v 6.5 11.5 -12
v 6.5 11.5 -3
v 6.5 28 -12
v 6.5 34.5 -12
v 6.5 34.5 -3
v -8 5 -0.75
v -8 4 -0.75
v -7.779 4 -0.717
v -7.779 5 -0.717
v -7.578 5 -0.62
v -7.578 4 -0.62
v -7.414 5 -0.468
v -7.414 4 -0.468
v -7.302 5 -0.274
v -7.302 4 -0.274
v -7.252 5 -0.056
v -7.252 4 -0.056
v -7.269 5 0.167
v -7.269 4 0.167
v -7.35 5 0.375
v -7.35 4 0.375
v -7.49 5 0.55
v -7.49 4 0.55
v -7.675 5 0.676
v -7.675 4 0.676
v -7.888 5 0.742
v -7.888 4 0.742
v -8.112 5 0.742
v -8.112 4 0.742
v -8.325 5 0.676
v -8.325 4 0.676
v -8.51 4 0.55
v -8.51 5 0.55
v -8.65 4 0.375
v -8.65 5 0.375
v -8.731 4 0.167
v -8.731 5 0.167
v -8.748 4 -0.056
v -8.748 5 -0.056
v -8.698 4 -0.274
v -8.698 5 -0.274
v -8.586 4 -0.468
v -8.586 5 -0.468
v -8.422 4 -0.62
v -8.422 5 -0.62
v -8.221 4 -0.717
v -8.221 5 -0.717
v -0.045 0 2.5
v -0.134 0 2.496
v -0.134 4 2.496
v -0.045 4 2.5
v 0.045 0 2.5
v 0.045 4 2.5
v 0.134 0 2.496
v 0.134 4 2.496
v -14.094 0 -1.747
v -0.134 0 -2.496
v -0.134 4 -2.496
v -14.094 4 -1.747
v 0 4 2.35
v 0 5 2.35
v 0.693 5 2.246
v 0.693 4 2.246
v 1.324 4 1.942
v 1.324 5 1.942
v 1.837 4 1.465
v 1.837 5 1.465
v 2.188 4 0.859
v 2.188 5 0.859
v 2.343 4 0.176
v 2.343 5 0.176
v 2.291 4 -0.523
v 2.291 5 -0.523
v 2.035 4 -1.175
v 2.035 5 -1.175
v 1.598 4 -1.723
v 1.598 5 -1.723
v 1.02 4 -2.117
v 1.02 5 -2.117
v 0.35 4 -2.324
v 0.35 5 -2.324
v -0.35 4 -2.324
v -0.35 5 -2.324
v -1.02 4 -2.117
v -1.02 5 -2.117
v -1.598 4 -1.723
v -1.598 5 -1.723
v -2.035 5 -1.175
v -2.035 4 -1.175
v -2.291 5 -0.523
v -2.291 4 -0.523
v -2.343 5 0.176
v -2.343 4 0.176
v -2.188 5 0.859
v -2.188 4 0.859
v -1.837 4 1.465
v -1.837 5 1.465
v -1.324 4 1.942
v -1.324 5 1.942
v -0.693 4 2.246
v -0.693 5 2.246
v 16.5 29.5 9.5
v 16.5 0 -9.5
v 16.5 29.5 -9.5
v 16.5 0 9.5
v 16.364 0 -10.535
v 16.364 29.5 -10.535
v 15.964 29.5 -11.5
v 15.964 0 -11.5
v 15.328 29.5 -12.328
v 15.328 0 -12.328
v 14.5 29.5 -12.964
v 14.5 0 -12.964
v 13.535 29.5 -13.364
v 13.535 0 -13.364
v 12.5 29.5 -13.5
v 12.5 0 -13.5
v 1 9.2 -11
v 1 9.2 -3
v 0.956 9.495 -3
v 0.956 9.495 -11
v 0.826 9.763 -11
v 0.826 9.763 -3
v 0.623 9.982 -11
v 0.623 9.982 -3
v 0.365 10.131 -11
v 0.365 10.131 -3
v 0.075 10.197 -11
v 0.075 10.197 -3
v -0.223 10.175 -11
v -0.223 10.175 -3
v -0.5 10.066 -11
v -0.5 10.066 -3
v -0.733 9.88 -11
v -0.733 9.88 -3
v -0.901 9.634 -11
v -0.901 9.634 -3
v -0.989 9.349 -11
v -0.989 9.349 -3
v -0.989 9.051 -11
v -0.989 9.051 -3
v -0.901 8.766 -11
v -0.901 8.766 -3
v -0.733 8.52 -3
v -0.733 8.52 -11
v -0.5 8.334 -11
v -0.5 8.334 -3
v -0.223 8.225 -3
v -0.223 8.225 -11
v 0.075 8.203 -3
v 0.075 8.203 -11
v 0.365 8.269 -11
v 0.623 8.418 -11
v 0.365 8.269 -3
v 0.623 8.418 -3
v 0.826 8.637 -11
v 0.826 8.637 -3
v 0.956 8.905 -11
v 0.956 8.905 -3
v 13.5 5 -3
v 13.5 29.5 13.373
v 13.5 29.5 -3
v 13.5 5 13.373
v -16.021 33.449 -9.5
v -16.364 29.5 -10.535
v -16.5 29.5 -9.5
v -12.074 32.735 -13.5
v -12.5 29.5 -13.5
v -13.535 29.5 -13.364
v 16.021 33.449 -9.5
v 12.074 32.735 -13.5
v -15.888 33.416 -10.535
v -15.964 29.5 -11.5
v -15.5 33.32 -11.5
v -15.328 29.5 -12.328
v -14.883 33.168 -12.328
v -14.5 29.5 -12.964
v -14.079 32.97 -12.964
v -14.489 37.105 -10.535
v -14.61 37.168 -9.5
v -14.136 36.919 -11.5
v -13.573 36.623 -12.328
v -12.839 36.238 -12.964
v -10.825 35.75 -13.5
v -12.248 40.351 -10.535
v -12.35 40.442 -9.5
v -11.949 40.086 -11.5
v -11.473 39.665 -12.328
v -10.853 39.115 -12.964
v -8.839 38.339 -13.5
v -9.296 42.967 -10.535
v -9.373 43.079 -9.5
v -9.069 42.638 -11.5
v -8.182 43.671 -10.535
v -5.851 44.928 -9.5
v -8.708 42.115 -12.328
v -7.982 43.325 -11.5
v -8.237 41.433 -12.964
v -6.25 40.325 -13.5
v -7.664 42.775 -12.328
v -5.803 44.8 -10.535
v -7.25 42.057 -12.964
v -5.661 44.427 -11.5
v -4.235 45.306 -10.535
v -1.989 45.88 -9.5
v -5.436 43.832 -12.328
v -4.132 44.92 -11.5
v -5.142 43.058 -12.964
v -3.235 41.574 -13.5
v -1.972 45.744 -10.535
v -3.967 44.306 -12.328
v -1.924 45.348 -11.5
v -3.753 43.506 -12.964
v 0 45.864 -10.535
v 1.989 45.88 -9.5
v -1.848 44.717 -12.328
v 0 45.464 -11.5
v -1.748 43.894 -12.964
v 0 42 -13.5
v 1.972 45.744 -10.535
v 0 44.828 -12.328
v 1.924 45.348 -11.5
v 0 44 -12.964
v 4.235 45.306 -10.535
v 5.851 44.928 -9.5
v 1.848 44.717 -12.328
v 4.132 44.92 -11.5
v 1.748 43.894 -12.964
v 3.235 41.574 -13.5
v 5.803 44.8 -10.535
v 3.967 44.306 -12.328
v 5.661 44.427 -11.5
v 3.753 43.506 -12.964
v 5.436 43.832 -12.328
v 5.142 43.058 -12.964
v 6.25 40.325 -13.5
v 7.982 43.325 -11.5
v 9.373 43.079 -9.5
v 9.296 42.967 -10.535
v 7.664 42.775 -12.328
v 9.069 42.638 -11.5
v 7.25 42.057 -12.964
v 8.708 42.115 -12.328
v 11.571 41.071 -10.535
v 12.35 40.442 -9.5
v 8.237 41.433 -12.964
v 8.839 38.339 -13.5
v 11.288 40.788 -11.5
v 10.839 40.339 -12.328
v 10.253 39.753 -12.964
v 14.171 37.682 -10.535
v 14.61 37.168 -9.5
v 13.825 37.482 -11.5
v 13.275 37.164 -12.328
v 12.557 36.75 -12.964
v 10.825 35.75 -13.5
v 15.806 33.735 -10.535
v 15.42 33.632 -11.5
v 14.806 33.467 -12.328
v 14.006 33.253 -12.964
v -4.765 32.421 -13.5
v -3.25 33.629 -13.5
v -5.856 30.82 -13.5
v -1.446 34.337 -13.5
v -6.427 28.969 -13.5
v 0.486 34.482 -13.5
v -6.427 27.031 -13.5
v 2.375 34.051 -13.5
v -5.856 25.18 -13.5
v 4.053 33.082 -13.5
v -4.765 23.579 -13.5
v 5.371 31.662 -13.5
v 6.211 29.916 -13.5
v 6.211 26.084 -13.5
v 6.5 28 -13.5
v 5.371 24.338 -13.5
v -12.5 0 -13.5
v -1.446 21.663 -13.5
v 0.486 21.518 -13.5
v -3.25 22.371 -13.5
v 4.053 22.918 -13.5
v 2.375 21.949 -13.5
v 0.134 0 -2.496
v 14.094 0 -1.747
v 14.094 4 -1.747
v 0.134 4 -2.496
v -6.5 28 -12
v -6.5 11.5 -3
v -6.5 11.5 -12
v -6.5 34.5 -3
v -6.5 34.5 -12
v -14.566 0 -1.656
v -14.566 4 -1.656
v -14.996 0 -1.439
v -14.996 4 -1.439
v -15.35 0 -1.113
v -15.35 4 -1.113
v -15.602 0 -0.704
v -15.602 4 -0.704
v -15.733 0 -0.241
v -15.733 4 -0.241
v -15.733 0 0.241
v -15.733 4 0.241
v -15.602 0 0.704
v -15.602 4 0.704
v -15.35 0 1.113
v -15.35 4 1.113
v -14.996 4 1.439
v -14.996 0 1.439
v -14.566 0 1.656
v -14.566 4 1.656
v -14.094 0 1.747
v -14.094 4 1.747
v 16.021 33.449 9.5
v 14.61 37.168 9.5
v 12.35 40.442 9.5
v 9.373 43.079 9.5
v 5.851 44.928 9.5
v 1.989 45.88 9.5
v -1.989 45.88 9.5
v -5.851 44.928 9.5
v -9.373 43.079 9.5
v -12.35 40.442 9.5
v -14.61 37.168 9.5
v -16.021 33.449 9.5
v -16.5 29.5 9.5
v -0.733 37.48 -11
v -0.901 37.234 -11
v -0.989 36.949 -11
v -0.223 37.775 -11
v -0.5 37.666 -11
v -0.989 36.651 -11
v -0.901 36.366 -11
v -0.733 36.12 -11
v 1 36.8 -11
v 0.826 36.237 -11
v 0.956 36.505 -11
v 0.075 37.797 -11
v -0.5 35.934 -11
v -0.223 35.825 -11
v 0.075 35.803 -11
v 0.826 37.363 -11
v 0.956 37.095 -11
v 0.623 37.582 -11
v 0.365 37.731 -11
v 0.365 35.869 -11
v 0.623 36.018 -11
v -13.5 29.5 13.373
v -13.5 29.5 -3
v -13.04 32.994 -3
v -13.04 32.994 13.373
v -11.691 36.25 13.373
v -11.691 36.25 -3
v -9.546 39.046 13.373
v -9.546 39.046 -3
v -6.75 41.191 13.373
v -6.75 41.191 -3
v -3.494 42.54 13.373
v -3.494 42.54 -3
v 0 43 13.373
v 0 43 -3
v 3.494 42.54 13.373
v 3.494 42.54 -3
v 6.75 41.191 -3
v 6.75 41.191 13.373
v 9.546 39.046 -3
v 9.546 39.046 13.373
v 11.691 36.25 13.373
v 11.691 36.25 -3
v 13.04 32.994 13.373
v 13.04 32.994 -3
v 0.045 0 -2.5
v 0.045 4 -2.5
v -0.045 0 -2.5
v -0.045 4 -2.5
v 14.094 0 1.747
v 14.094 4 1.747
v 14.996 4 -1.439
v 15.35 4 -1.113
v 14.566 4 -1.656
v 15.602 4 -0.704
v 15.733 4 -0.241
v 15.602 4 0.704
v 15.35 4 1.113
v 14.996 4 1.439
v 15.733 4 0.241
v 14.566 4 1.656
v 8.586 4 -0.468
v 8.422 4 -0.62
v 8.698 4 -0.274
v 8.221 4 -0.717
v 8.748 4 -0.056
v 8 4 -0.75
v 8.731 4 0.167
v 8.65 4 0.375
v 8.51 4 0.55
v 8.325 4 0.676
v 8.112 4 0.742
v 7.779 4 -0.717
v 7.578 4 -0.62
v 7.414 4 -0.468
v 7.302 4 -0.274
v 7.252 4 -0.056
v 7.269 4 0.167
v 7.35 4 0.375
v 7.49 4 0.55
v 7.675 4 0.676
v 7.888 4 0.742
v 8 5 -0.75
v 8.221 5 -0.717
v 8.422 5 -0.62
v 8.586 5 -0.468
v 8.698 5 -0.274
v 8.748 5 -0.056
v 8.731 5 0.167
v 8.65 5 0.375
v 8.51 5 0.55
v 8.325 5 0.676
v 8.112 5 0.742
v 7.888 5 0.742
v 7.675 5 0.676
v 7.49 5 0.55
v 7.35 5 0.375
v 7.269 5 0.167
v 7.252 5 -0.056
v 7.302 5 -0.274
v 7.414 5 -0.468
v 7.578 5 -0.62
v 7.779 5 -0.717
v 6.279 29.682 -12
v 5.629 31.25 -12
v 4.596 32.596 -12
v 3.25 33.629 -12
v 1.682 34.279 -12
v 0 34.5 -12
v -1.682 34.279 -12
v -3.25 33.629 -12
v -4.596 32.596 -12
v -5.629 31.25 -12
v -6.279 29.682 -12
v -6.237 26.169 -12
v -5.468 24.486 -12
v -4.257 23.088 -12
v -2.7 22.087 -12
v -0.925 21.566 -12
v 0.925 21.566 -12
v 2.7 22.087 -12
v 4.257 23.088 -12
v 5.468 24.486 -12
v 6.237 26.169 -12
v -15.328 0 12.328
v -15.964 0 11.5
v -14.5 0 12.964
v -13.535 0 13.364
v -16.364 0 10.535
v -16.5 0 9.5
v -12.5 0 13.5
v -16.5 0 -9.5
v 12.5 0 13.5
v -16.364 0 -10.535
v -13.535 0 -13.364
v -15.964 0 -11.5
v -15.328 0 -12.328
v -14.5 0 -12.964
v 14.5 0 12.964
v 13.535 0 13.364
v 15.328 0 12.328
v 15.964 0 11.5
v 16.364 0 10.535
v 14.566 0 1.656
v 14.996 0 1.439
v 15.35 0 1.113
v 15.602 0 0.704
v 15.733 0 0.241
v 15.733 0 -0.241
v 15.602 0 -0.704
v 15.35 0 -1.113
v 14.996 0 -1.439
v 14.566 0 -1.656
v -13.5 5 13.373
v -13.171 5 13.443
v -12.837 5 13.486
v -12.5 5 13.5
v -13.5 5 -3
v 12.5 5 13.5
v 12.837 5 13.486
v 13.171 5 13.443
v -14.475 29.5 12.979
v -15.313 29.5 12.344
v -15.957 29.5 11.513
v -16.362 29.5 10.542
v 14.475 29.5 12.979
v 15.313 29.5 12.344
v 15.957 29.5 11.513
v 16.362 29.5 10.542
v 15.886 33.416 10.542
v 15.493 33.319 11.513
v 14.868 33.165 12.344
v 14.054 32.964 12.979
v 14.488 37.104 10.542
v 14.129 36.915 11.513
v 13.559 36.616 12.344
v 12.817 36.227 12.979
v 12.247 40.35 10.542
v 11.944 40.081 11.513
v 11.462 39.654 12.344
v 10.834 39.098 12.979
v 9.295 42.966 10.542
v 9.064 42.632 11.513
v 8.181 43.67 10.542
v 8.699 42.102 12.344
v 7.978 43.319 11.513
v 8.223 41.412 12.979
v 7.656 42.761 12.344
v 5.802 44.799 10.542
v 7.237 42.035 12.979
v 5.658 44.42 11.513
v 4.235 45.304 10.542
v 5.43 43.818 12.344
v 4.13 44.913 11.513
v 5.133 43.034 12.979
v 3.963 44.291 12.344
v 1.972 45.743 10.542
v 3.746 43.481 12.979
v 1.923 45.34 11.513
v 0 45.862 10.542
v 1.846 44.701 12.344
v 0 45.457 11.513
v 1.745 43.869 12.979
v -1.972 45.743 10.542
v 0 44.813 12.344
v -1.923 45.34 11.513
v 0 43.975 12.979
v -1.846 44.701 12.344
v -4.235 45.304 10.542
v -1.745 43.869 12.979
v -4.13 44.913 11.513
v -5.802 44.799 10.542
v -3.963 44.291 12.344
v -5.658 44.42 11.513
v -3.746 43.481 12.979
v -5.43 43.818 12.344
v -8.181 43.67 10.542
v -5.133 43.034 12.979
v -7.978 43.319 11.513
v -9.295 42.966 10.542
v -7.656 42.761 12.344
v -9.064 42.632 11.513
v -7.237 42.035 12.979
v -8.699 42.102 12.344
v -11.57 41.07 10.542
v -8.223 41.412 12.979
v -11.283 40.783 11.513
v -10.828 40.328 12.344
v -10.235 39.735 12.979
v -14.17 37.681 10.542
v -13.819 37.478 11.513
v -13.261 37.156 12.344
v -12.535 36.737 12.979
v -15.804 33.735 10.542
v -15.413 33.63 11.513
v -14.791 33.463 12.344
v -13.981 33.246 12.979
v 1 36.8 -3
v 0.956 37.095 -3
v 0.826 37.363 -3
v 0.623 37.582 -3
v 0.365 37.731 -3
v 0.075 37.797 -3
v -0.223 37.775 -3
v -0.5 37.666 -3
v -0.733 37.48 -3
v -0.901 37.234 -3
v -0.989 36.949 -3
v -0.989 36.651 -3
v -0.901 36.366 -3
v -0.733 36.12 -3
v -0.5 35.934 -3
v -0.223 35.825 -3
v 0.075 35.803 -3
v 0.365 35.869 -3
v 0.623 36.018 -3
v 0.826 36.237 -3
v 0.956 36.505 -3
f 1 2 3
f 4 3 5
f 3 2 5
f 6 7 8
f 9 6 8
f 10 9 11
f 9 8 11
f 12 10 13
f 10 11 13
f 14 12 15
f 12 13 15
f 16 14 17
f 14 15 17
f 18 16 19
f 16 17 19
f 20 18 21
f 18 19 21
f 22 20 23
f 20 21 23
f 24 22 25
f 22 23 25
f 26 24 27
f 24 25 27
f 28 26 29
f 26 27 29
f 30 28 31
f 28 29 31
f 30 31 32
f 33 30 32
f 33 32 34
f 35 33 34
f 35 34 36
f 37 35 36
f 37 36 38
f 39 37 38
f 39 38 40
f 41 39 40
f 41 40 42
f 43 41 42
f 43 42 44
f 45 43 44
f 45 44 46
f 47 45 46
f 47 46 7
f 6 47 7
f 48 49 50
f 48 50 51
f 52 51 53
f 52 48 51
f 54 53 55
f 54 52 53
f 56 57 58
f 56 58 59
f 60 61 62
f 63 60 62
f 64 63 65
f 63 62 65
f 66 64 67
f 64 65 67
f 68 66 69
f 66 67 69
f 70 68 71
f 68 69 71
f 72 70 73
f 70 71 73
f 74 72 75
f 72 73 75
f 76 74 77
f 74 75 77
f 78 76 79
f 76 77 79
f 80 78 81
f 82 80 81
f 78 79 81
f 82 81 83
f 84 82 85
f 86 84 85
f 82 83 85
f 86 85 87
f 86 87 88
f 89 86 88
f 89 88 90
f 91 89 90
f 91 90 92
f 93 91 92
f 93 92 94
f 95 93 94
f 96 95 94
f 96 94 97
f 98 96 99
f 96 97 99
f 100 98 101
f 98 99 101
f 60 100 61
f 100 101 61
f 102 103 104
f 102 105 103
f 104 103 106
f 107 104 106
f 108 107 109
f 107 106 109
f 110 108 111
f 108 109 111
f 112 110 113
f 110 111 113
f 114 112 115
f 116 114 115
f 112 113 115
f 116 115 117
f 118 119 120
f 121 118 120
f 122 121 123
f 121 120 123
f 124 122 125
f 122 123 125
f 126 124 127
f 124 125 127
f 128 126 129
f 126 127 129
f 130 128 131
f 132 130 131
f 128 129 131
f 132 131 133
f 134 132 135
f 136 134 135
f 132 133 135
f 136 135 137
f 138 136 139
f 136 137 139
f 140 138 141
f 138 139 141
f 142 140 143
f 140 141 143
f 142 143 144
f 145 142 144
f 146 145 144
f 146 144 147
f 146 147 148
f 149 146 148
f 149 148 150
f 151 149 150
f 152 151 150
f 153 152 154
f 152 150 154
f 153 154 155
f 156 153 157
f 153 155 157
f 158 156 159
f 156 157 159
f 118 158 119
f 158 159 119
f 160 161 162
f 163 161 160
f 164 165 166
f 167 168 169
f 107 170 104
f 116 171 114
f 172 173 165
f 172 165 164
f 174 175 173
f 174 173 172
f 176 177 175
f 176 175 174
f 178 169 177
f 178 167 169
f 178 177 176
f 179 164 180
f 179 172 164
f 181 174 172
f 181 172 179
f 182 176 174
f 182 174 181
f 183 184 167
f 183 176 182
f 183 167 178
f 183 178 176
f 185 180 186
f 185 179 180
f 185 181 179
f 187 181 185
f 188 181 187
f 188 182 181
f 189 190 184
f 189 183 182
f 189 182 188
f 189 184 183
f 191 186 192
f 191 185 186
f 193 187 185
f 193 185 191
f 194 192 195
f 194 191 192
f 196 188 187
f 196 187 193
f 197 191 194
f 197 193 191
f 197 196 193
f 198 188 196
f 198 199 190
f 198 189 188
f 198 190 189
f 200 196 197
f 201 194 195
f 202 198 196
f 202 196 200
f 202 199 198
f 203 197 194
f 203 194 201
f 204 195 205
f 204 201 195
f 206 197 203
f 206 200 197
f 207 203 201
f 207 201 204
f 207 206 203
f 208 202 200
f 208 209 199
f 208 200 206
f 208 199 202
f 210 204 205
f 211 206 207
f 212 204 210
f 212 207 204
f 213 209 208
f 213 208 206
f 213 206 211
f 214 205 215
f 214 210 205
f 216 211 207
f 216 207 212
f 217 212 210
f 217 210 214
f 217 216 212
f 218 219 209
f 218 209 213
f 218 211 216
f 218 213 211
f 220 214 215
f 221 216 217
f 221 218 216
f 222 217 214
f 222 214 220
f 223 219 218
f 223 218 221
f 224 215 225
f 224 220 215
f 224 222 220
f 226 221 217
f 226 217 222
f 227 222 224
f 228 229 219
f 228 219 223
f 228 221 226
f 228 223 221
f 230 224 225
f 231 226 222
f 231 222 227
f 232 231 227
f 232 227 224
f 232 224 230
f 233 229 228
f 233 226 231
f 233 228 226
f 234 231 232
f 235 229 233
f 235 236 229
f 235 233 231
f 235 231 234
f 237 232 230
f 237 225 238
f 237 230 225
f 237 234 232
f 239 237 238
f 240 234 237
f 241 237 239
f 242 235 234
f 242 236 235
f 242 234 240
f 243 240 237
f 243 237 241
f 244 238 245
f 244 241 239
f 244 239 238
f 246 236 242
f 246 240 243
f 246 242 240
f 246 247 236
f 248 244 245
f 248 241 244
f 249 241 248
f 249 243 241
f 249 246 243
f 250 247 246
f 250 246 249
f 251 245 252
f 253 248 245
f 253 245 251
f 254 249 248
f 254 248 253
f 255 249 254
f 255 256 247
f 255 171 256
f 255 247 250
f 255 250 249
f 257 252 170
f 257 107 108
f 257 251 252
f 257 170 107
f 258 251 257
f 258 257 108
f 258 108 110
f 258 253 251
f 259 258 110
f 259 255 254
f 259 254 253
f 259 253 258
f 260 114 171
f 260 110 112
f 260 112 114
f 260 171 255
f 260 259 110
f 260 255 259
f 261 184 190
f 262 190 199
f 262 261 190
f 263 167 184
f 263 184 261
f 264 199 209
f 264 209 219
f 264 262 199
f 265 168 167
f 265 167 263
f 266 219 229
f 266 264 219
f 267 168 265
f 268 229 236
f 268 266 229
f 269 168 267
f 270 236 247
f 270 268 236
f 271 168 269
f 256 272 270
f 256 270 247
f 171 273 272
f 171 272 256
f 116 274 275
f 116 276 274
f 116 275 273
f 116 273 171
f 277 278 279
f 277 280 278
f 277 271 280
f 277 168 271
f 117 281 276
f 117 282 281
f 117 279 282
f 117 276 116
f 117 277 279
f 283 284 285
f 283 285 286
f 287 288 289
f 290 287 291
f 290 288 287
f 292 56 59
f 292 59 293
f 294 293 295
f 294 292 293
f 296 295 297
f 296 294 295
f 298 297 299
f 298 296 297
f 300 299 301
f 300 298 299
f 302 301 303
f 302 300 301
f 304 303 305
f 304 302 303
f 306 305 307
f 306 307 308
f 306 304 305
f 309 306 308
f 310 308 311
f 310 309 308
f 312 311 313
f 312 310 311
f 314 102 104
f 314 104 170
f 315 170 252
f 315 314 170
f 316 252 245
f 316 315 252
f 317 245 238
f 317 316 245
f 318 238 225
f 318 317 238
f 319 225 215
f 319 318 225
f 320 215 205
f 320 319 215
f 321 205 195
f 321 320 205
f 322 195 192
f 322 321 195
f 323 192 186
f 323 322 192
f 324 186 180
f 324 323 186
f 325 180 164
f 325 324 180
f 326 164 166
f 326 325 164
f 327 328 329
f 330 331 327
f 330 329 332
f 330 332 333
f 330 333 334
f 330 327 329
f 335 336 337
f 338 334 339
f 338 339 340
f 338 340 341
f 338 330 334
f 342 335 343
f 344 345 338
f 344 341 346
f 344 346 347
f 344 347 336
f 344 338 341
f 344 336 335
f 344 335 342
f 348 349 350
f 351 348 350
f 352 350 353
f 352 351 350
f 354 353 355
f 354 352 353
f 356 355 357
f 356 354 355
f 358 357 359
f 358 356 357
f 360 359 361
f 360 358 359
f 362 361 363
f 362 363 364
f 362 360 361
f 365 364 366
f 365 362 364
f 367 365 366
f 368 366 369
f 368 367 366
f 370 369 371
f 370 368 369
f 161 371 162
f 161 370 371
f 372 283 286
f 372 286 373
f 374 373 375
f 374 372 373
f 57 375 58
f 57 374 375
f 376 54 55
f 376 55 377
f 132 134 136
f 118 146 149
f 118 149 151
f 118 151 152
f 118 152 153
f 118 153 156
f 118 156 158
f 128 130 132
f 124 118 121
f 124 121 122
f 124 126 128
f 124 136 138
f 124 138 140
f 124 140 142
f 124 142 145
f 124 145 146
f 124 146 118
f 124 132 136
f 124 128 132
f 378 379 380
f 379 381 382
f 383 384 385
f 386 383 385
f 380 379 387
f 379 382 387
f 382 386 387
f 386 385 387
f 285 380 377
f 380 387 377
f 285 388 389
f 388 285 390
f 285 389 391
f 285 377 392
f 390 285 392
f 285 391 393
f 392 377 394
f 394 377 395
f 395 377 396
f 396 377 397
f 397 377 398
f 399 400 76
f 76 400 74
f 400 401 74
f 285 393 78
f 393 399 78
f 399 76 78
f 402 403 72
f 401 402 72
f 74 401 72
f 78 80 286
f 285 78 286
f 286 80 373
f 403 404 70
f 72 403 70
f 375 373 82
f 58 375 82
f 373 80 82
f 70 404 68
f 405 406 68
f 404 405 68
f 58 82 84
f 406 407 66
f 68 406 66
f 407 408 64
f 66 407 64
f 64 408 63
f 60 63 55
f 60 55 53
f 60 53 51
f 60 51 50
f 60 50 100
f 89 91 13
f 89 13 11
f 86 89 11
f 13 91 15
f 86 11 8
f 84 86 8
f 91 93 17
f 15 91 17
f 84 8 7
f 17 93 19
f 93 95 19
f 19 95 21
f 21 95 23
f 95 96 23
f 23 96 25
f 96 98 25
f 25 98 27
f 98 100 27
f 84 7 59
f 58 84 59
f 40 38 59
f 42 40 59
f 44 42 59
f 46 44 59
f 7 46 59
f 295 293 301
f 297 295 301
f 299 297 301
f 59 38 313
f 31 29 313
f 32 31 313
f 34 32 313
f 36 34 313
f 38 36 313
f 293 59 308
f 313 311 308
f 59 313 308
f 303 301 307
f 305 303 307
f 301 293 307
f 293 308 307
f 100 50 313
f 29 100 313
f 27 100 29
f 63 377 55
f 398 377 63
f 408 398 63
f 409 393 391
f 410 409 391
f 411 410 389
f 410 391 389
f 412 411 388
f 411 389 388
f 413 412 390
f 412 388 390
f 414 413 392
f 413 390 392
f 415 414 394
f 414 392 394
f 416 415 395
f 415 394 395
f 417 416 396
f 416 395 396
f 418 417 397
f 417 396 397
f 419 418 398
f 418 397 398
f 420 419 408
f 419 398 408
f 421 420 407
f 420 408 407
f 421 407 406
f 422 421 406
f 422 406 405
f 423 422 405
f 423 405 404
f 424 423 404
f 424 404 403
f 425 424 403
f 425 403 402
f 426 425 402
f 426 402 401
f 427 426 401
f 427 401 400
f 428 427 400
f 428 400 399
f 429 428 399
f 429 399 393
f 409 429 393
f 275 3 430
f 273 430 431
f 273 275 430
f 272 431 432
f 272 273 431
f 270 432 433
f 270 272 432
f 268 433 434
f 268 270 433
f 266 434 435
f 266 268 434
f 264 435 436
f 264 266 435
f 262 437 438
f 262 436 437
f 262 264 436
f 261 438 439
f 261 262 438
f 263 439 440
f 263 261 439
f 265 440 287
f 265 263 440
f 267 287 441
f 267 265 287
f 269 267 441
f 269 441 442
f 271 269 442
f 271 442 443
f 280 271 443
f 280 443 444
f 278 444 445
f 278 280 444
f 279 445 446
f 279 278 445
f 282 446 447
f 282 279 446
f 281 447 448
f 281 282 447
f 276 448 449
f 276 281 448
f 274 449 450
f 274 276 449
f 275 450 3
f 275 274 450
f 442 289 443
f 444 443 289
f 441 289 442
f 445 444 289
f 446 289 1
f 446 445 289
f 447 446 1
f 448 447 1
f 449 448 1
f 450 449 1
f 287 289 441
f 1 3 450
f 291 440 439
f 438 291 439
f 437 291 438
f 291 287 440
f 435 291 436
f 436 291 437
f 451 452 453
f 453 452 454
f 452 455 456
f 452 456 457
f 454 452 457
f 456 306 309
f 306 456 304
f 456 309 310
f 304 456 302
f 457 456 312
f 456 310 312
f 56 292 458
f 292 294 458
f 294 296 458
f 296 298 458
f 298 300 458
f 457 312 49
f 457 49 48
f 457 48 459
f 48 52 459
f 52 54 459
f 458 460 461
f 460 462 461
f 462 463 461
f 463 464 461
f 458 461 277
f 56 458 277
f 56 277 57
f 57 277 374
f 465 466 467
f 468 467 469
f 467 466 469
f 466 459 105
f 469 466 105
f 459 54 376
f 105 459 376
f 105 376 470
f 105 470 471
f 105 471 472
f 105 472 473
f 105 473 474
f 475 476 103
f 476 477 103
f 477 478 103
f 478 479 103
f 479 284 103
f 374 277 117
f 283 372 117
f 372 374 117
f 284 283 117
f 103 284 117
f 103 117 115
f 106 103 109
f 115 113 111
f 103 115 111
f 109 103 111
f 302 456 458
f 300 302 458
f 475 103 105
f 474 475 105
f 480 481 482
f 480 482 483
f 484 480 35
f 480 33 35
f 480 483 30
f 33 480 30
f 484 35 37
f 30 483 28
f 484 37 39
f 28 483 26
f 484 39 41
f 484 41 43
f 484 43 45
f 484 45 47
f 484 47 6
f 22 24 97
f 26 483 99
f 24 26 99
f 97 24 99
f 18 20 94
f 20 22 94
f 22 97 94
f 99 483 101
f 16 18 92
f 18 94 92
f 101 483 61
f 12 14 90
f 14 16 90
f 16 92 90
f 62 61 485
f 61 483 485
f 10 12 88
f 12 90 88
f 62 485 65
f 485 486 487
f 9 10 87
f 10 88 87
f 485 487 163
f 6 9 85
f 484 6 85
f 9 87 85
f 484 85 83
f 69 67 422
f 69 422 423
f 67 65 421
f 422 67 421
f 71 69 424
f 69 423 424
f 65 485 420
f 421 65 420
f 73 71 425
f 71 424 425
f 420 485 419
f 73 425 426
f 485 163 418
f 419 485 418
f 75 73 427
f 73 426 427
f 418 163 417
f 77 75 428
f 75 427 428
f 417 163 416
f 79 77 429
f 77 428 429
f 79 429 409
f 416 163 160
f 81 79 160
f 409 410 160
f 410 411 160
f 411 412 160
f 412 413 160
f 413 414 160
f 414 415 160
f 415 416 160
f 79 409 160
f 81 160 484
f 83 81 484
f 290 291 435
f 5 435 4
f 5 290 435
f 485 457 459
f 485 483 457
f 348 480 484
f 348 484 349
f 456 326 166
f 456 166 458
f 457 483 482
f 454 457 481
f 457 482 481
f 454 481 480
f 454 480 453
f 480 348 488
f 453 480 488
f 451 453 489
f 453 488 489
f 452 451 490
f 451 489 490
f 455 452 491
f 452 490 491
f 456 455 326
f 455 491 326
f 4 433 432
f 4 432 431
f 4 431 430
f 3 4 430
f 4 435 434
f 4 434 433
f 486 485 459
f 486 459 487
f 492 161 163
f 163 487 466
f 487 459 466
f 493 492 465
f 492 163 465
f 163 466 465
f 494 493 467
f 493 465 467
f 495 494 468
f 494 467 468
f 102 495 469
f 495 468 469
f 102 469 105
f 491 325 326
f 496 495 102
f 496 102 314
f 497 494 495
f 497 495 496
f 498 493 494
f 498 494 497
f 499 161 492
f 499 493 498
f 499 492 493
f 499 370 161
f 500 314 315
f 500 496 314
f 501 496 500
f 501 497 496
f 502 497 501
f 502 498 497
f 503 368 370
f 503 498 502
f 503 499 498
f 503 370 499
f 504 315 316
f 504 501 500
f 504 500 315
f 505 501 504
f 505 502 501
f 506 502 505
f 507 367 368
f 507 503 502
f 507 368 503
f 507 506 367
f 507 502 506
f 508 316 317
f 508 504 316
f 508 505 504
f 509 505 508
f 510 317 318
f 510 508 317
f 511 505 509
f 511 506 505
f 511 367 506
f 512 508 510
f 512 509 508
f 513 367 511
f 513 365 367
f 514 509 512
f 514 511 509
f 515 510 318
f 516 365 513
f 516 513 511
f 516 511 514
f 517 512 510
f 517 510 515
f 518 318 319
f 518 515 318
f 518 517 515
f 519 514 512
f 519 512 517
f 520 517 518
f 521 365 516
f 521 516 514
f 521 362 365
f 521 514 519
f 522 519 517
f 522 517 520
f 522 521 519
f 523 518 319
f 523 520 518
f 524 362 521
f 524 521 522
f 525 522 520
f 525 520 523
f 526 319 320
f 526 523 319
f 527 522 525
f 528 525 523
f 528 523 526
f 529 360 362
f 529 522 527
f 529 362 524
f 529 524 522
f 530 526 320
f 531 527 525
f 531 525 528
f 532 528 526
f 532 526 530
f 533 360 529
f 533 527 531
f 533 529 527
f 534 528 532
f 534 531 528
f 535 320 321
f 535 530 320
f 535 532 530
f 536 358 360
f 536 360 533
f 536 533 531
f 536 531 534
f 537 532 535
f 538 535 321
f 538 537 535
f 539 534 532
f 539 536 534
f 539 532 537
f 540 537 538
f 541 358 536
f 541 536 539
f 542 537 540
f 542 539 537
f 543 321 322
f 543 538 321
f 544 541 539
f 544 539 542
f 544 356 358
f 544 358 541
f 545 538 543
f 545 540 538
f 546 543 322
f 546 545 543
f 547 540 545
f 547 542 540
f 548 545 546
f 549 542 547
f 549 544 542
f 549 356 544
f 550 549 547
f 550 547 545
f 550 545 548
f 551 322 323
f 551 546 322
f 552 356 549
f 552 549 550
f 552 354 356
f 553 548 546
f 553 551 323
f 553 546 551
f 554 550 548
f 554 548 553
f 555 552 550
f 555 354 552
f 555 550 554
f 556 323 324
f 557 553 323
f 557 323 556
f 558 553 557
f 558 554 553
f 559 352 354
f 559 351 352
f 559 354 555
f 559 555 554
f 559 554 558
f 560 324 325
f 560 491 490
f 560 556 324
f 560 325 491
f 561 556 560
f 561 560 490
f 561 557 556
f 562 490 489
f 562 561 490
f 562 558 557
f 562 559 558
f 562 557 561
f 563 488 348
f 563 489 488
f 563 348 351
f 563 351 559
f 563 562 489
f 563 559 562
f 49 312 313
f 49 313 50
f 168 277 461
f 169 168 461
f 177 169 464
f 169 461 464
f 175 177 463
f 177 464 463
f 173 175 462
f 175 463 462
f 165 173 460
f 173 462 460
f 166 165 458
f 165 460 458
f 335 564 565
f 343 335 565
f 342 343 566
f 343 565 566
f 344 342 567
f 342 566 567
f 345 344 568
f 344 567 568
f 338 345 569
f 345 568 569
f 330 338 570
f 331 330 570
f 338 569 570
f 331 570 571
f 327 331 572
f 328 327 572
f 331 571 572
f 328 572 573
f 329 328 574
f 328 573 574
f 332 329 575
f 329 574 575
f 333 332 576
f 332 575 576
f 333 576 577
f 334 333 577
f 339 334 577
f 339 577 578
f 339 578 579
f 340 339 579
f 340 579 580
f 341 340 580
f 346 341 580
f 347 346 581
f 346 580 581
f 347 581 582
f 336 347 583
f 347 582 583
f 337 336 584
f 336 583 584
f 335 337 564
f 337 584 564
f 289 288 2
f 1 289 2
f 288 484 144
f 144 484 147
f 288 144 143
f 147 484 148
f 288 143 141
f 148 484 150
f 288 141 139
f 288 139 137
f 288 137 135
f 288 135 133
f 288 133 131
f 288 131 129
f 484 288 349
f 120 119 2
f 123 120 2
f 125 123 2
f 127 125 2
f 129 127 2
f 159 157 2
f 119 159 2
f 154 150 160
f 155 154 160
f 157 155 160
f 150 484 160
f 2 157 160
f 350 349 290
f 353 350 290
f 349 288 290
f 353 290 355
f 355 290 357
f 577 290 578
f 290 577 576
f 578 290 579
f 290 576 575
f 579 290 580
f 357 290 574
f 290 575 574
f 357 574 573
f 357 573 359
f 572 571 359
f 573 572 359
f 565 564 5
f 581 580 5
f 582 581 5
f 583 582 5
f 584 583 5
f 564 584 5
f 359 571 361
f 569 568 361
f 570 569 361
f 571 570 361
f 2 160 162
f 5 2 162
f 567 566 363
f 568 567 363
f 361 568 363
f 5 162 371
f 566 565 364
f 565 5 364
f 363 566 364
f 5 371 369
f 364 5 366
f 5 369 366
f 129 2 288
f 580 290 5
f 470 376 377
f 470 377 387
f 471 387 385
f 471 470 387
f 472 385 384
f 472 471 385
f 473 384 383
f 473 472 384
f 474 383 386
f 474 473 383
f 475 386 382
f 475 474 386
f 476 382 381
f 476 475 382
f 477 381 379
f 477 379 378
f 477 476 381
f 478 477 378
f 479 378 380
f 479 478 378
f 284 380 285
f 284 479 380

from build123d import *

# Parameters (mm, degrees)
SKETCH1_W               = 33
SKETCH1_H               = 27
BOSS_EXTRUDE1_DEPTH     = 46
SKETCH2_W               = 16.5
SKETCH2_H               = 41
CUT_EXTRUDE1_DEPTH      = 59.200085911
FILLET1_RADIUS          = 16.5
FILLET1_LENGTH          = 10.5
SKETCH3_W               = 13
SKETCH3_H               = 23
CUT_EXTRUDE2_DEPTH      = 9
CUT_EXTRUDE3_DEPTH      = 56.12259065
CUT_EXTRUDE3_DEPTH_BACK = 56.12259065
SKETCH4_R               = 6.5
SKETCH5_R               = 1
CUT_EXTRUDE4_DEPTH      = 8
BOSS_EXTRUDE2_START     = 16.5
BOSS_EXTRUDE2_DEPTH     = 16.5
FILLET2_R               = 4
CUT_EXTRUDE5_DEPTH      = 4
SKETCH8_R               = 1.3
CUT_EXTRUDE6_DEPTH      = 1.75
SKETCH9_R               = 2.35
CUT_EXTRUDE7_DEPTH      = 1
SKETCH10_R              = 0.75
CUT_EXTRUDE8_DEPTH      = 1.75


with BuildPart() as part:
    # Sketch1 → Boss-Extrude1 (new body)
    with BuildSketch(Plane(origin=(0, 0, 0), x_dir=(1, 0, 0), z_dir=(0, 1, 0))):
        Rectangle(SKETCH1_W, SKETCH1_H)
    extrude(amount=BOSS_EXTRUDE1_DEPTH)

    # Sketch2 → Cut-Extrude1 (cut, through all)
    with BuildSketch(Plane(origin=(16.5, 0, 0), x_dir=(0, 0, -1), z_dir=(1, 0, 0))):
        with Locations((-5.25, 25.5)):
            Rectangle(SKETCH2_W, SKETCH2_H)
    extrude(amount=-CUT_EXTRUDE1_DEPTH, mode=Mode.SUBTRACT)

    # Fillet1: full round fillet: the end face becomes a half cylinder, R = half its width
    fillet1_face = Plane((0, 46, -8.25), x_dir=(0, 0, 1), z_dir=(0, 1, 0))  # on the end face: x along it, z out of the body
    fillet1_slab = fillet1_face.offset(-FILLET1_RADIUS / 2) * Box(FILLET1_LENGTH, 2 * FILLET1_RADIUS, FILLET1_RADIUS, mode=Mode.PRIVATE)  # the body's end, R deep
    fillet1_round = Plane((0, 29.5, -8.25), x_dir=(0, 1, 0), z_dir=(0, 0, 1)) * Cylinder(FILLET1_RADIUS, FILLET1_LENGTH, mode=Mode.PRIVATE)  # its axis R under the face
    add(fillet1_slab - fillet1_round, mode=Mode.SUBTRACT)

    # Sketch3 → Cut-Extrude2 (cut)
    with BuildSketch(Plane.XY.offset(-3)):
        with Locations((0, 23)):
            Rectangle(SKETCH3_W, SKETCH3_H)
    extrude(amount=-CUT_EXTRUDE2_DEPTH, mode=Mode.SUBTRACT)

    # Sketch4 → Cut-Extrude3 (cut, two sides: drawn at the far end of the back side and taken through both)
    with BuildSketch(Plane.XY.offset(-12).offset(-CUT_EXTRUDE3_DEPTH_BACK)):
        with Locations((0, 28)):
            Circle(SKETCH4_R)
    extrude(amount=CUT_EXTRUDE3_DEPTH + CUT_EXTRUDE3_DEPTH_BACK, mode=Mode.SUBTRACT)

    # Sketch5 → Cut-Extrude4 (cut)
    with BuildSketch(Plane.XY.offset(-3)):
        with Locations((0, 36.8)):
            Circle(SKETCH5_R)
        with Locations((0, 9.2)):
            Circle(SKETCH5_R)
    extrude(amount=-CUT_EXTRUDE4_DEPTH, mode=Mode.SUBTRACT)

    # Sketch6 → Boss-Extrude2 (add)
    with BuildSketch(Plane.XY.offset(-3).offset(BOSS_EXTRUDE2_START)):
        with BuildLine():
            Line((13.5, 5), (16.5, 5))
            Line((16.5, 5), (16.5, 29.5))
            ThreePointArc((16.5, 29.5), (0, 46), (-16.5, 29.5))
            Line((-16.5, 29.5), (-16.5, 5))
            Line((-16.5, 5), (-13.5, 5))
            Line((-13.5, 5), (-13.5, 8))
            Line((-13.5, 8), (-13.5, 29.5))
            ThreePointArc((-13.5, 29.5), (0, 43), (13.5, 29.5))
            Line((13.5, 29.5), (13.5, 8))
            Line((13.5, 8), (13.5, 5))
        make_face()
    extrude(amount=-BOSS_EXTRUDE2_DEPTH)

    # Fillet2
    # the kernel refuses this fillet: 4 mm, written as the material it takes off along each edge
    with BuildSketch(Plane(origin=(16.5, -10, 13.5), x_dir=(-1, 0, 0), z_dir=(0, 1, 0)), Plane(origin=(-16.5, 29.5, 13.5), x_dir=(1, 0, 0), z_dir=(0, -1, 0)), Plane(origin=(-16.5, -10, -13.5), x_dir=(1, 0, 0), z_dir=(0, 1, 0))) as fillet2_piece_1:
        with BuildLine():
            CenterArc((FILLET2_R, -FILLET2_R), FILLET2_R, 90, 90)
            Line((0, -FILLET2_R), (0, 0))
            Line((0, 0), (FILLET2_R, 0))
        make_face()
    extrude(amount=39.5, mode=Mode.SUBTRACT)
    with BuildSketch(Plane(origin=(16.5, -10, -13.5), x_dir=(-1, 0, 0), z_dir=(0, 1, 0))) as fillet2_piece_2:
        with BuildLine():
            CenterArc((FILLET2_R, FILLET2_R), FILLET2_R, 180, 90)
            Line((0, FILLET2_R), (0, 0))
            Line((0, 0), (FILLET2_R, 0))
        make_face()
    extrude(amount=39.5, mode=Mode.SUBTRACT)
    with BuildSketch(Plane(origin=(0, 29.5, -13.5), x_dir=(-1, 0, 0), z_dir=(0, -1, 0))) as fillet2_piece_3:
        with BuildLine():
            CenterArc((16.5 - FILLET2_R, -FILLET2_R), FILLET2_R, 0, 90)
            Line((16.5, -FILLET2_R), (16.5, 0))
            Line((16.5, 0), (16.5 - FILLET2_R, 0))
        make_face()
    revolve(axis=Axis((0, 29.5, -13.5), (0, 0, -1)), revolution_arc=180, mode=Mode.SUBTRACT)
    with BuildSketch(Plane(origin=(0, 29.5, 13.5), x_dir=(1, 0, 0), z_dir=(0, -1, 0))) as fillet2_piece_4:
        with BuildLine():
            CenterArc((16.5 - FILLET2_R, -FILLET2_R), FILLET2_R, 360, 90)
            Line((16.5, -FILLET2_R), (16.5, 0))
            Line((16.5, 0), (16.5 - FILLET2_R, 0))
        make_face()
    revolve(axis=Axis((0, 29.5, 13.5), (0, 0, 1)), revolution_arc=180, mode=Mode.SUBTRACT)

    # Sketch7 → Cut-Extrude5 (cut)
    with BuildSketch(Plane.XZ):
        with BuildLine():
            Line((-14.09375, 1.747487035), (-0.133928571, 2.49641005))
            ThreePointArc((-0.133928571, 2.49641005), (0, 2.5), (0.133928571, 2.49641005))
            Line((0.133928571, 2.49641005), (14.09375, 1.747487035))
            ThreePointArc((14.09375, 1.747487035), (15.75, 0), (14.09375, -1.747487035))
            Line((14.09375, -1.747487035), (0.133928571, -2.49641005))
            ThreePointArc((0.133928571, -2.49641005), (0, -2.5), (-0.133928571, -2.49641005))
            Line((-0.133928571, -2.49641005), (-14.09375, -1.747487035))
            ThreePointArc((-14.09375, -1.747487035), (-15.75, 0), (-14.09375, 1.747487035))
        make_face()
    extrude(amount=-CUT_EXTRUDE5_DEPTH, mode=Mode.SUBTRACT)

    # Sketch8 → Cut-Extrude6 (cut)
    with BuildSketch(Plane.XZ.offset(-4)):
        with Locations(Location((0, 0, 0), (0, 0, 270))):
            Circle(SKETCH8_R)
    extrude(amount=-CUT_EXTRUDE6_DEPTH, mode=Mode.SUBTRACT)

    # Sketch9 → Cut-Extrude7 (cut)
    with BuildSketch(Plane(origin=(0, 5, 0), x_dir=(1, 0, 0), z_dir=(0, 1, 0))):
        with Locations(Location((0, 0, 0), (0, 0, 270))):
            Circle(SKETCH9_R)
    extrude(amount=-CUT_EXTRUDE7_DEPTH, mode=Mode.SUBTRACT)

    # Sketch10 → Cut-Extrude8 (cut)
    with BuildSketch(Plane.XZ.offset(-4)):
        with Locations(Location((8, 0, 0), (0, 0, 270))):
            Circle(SKETCH10_R)
        with Locations(Location((-8, 0, 0), (0, 0, 270))):
            Circle(SKETCH10_R)
    extrude(amount=-CUT_EXTRUDE8_DEPTH, mode=Mode.SUBTRACT)


solid = part.part
